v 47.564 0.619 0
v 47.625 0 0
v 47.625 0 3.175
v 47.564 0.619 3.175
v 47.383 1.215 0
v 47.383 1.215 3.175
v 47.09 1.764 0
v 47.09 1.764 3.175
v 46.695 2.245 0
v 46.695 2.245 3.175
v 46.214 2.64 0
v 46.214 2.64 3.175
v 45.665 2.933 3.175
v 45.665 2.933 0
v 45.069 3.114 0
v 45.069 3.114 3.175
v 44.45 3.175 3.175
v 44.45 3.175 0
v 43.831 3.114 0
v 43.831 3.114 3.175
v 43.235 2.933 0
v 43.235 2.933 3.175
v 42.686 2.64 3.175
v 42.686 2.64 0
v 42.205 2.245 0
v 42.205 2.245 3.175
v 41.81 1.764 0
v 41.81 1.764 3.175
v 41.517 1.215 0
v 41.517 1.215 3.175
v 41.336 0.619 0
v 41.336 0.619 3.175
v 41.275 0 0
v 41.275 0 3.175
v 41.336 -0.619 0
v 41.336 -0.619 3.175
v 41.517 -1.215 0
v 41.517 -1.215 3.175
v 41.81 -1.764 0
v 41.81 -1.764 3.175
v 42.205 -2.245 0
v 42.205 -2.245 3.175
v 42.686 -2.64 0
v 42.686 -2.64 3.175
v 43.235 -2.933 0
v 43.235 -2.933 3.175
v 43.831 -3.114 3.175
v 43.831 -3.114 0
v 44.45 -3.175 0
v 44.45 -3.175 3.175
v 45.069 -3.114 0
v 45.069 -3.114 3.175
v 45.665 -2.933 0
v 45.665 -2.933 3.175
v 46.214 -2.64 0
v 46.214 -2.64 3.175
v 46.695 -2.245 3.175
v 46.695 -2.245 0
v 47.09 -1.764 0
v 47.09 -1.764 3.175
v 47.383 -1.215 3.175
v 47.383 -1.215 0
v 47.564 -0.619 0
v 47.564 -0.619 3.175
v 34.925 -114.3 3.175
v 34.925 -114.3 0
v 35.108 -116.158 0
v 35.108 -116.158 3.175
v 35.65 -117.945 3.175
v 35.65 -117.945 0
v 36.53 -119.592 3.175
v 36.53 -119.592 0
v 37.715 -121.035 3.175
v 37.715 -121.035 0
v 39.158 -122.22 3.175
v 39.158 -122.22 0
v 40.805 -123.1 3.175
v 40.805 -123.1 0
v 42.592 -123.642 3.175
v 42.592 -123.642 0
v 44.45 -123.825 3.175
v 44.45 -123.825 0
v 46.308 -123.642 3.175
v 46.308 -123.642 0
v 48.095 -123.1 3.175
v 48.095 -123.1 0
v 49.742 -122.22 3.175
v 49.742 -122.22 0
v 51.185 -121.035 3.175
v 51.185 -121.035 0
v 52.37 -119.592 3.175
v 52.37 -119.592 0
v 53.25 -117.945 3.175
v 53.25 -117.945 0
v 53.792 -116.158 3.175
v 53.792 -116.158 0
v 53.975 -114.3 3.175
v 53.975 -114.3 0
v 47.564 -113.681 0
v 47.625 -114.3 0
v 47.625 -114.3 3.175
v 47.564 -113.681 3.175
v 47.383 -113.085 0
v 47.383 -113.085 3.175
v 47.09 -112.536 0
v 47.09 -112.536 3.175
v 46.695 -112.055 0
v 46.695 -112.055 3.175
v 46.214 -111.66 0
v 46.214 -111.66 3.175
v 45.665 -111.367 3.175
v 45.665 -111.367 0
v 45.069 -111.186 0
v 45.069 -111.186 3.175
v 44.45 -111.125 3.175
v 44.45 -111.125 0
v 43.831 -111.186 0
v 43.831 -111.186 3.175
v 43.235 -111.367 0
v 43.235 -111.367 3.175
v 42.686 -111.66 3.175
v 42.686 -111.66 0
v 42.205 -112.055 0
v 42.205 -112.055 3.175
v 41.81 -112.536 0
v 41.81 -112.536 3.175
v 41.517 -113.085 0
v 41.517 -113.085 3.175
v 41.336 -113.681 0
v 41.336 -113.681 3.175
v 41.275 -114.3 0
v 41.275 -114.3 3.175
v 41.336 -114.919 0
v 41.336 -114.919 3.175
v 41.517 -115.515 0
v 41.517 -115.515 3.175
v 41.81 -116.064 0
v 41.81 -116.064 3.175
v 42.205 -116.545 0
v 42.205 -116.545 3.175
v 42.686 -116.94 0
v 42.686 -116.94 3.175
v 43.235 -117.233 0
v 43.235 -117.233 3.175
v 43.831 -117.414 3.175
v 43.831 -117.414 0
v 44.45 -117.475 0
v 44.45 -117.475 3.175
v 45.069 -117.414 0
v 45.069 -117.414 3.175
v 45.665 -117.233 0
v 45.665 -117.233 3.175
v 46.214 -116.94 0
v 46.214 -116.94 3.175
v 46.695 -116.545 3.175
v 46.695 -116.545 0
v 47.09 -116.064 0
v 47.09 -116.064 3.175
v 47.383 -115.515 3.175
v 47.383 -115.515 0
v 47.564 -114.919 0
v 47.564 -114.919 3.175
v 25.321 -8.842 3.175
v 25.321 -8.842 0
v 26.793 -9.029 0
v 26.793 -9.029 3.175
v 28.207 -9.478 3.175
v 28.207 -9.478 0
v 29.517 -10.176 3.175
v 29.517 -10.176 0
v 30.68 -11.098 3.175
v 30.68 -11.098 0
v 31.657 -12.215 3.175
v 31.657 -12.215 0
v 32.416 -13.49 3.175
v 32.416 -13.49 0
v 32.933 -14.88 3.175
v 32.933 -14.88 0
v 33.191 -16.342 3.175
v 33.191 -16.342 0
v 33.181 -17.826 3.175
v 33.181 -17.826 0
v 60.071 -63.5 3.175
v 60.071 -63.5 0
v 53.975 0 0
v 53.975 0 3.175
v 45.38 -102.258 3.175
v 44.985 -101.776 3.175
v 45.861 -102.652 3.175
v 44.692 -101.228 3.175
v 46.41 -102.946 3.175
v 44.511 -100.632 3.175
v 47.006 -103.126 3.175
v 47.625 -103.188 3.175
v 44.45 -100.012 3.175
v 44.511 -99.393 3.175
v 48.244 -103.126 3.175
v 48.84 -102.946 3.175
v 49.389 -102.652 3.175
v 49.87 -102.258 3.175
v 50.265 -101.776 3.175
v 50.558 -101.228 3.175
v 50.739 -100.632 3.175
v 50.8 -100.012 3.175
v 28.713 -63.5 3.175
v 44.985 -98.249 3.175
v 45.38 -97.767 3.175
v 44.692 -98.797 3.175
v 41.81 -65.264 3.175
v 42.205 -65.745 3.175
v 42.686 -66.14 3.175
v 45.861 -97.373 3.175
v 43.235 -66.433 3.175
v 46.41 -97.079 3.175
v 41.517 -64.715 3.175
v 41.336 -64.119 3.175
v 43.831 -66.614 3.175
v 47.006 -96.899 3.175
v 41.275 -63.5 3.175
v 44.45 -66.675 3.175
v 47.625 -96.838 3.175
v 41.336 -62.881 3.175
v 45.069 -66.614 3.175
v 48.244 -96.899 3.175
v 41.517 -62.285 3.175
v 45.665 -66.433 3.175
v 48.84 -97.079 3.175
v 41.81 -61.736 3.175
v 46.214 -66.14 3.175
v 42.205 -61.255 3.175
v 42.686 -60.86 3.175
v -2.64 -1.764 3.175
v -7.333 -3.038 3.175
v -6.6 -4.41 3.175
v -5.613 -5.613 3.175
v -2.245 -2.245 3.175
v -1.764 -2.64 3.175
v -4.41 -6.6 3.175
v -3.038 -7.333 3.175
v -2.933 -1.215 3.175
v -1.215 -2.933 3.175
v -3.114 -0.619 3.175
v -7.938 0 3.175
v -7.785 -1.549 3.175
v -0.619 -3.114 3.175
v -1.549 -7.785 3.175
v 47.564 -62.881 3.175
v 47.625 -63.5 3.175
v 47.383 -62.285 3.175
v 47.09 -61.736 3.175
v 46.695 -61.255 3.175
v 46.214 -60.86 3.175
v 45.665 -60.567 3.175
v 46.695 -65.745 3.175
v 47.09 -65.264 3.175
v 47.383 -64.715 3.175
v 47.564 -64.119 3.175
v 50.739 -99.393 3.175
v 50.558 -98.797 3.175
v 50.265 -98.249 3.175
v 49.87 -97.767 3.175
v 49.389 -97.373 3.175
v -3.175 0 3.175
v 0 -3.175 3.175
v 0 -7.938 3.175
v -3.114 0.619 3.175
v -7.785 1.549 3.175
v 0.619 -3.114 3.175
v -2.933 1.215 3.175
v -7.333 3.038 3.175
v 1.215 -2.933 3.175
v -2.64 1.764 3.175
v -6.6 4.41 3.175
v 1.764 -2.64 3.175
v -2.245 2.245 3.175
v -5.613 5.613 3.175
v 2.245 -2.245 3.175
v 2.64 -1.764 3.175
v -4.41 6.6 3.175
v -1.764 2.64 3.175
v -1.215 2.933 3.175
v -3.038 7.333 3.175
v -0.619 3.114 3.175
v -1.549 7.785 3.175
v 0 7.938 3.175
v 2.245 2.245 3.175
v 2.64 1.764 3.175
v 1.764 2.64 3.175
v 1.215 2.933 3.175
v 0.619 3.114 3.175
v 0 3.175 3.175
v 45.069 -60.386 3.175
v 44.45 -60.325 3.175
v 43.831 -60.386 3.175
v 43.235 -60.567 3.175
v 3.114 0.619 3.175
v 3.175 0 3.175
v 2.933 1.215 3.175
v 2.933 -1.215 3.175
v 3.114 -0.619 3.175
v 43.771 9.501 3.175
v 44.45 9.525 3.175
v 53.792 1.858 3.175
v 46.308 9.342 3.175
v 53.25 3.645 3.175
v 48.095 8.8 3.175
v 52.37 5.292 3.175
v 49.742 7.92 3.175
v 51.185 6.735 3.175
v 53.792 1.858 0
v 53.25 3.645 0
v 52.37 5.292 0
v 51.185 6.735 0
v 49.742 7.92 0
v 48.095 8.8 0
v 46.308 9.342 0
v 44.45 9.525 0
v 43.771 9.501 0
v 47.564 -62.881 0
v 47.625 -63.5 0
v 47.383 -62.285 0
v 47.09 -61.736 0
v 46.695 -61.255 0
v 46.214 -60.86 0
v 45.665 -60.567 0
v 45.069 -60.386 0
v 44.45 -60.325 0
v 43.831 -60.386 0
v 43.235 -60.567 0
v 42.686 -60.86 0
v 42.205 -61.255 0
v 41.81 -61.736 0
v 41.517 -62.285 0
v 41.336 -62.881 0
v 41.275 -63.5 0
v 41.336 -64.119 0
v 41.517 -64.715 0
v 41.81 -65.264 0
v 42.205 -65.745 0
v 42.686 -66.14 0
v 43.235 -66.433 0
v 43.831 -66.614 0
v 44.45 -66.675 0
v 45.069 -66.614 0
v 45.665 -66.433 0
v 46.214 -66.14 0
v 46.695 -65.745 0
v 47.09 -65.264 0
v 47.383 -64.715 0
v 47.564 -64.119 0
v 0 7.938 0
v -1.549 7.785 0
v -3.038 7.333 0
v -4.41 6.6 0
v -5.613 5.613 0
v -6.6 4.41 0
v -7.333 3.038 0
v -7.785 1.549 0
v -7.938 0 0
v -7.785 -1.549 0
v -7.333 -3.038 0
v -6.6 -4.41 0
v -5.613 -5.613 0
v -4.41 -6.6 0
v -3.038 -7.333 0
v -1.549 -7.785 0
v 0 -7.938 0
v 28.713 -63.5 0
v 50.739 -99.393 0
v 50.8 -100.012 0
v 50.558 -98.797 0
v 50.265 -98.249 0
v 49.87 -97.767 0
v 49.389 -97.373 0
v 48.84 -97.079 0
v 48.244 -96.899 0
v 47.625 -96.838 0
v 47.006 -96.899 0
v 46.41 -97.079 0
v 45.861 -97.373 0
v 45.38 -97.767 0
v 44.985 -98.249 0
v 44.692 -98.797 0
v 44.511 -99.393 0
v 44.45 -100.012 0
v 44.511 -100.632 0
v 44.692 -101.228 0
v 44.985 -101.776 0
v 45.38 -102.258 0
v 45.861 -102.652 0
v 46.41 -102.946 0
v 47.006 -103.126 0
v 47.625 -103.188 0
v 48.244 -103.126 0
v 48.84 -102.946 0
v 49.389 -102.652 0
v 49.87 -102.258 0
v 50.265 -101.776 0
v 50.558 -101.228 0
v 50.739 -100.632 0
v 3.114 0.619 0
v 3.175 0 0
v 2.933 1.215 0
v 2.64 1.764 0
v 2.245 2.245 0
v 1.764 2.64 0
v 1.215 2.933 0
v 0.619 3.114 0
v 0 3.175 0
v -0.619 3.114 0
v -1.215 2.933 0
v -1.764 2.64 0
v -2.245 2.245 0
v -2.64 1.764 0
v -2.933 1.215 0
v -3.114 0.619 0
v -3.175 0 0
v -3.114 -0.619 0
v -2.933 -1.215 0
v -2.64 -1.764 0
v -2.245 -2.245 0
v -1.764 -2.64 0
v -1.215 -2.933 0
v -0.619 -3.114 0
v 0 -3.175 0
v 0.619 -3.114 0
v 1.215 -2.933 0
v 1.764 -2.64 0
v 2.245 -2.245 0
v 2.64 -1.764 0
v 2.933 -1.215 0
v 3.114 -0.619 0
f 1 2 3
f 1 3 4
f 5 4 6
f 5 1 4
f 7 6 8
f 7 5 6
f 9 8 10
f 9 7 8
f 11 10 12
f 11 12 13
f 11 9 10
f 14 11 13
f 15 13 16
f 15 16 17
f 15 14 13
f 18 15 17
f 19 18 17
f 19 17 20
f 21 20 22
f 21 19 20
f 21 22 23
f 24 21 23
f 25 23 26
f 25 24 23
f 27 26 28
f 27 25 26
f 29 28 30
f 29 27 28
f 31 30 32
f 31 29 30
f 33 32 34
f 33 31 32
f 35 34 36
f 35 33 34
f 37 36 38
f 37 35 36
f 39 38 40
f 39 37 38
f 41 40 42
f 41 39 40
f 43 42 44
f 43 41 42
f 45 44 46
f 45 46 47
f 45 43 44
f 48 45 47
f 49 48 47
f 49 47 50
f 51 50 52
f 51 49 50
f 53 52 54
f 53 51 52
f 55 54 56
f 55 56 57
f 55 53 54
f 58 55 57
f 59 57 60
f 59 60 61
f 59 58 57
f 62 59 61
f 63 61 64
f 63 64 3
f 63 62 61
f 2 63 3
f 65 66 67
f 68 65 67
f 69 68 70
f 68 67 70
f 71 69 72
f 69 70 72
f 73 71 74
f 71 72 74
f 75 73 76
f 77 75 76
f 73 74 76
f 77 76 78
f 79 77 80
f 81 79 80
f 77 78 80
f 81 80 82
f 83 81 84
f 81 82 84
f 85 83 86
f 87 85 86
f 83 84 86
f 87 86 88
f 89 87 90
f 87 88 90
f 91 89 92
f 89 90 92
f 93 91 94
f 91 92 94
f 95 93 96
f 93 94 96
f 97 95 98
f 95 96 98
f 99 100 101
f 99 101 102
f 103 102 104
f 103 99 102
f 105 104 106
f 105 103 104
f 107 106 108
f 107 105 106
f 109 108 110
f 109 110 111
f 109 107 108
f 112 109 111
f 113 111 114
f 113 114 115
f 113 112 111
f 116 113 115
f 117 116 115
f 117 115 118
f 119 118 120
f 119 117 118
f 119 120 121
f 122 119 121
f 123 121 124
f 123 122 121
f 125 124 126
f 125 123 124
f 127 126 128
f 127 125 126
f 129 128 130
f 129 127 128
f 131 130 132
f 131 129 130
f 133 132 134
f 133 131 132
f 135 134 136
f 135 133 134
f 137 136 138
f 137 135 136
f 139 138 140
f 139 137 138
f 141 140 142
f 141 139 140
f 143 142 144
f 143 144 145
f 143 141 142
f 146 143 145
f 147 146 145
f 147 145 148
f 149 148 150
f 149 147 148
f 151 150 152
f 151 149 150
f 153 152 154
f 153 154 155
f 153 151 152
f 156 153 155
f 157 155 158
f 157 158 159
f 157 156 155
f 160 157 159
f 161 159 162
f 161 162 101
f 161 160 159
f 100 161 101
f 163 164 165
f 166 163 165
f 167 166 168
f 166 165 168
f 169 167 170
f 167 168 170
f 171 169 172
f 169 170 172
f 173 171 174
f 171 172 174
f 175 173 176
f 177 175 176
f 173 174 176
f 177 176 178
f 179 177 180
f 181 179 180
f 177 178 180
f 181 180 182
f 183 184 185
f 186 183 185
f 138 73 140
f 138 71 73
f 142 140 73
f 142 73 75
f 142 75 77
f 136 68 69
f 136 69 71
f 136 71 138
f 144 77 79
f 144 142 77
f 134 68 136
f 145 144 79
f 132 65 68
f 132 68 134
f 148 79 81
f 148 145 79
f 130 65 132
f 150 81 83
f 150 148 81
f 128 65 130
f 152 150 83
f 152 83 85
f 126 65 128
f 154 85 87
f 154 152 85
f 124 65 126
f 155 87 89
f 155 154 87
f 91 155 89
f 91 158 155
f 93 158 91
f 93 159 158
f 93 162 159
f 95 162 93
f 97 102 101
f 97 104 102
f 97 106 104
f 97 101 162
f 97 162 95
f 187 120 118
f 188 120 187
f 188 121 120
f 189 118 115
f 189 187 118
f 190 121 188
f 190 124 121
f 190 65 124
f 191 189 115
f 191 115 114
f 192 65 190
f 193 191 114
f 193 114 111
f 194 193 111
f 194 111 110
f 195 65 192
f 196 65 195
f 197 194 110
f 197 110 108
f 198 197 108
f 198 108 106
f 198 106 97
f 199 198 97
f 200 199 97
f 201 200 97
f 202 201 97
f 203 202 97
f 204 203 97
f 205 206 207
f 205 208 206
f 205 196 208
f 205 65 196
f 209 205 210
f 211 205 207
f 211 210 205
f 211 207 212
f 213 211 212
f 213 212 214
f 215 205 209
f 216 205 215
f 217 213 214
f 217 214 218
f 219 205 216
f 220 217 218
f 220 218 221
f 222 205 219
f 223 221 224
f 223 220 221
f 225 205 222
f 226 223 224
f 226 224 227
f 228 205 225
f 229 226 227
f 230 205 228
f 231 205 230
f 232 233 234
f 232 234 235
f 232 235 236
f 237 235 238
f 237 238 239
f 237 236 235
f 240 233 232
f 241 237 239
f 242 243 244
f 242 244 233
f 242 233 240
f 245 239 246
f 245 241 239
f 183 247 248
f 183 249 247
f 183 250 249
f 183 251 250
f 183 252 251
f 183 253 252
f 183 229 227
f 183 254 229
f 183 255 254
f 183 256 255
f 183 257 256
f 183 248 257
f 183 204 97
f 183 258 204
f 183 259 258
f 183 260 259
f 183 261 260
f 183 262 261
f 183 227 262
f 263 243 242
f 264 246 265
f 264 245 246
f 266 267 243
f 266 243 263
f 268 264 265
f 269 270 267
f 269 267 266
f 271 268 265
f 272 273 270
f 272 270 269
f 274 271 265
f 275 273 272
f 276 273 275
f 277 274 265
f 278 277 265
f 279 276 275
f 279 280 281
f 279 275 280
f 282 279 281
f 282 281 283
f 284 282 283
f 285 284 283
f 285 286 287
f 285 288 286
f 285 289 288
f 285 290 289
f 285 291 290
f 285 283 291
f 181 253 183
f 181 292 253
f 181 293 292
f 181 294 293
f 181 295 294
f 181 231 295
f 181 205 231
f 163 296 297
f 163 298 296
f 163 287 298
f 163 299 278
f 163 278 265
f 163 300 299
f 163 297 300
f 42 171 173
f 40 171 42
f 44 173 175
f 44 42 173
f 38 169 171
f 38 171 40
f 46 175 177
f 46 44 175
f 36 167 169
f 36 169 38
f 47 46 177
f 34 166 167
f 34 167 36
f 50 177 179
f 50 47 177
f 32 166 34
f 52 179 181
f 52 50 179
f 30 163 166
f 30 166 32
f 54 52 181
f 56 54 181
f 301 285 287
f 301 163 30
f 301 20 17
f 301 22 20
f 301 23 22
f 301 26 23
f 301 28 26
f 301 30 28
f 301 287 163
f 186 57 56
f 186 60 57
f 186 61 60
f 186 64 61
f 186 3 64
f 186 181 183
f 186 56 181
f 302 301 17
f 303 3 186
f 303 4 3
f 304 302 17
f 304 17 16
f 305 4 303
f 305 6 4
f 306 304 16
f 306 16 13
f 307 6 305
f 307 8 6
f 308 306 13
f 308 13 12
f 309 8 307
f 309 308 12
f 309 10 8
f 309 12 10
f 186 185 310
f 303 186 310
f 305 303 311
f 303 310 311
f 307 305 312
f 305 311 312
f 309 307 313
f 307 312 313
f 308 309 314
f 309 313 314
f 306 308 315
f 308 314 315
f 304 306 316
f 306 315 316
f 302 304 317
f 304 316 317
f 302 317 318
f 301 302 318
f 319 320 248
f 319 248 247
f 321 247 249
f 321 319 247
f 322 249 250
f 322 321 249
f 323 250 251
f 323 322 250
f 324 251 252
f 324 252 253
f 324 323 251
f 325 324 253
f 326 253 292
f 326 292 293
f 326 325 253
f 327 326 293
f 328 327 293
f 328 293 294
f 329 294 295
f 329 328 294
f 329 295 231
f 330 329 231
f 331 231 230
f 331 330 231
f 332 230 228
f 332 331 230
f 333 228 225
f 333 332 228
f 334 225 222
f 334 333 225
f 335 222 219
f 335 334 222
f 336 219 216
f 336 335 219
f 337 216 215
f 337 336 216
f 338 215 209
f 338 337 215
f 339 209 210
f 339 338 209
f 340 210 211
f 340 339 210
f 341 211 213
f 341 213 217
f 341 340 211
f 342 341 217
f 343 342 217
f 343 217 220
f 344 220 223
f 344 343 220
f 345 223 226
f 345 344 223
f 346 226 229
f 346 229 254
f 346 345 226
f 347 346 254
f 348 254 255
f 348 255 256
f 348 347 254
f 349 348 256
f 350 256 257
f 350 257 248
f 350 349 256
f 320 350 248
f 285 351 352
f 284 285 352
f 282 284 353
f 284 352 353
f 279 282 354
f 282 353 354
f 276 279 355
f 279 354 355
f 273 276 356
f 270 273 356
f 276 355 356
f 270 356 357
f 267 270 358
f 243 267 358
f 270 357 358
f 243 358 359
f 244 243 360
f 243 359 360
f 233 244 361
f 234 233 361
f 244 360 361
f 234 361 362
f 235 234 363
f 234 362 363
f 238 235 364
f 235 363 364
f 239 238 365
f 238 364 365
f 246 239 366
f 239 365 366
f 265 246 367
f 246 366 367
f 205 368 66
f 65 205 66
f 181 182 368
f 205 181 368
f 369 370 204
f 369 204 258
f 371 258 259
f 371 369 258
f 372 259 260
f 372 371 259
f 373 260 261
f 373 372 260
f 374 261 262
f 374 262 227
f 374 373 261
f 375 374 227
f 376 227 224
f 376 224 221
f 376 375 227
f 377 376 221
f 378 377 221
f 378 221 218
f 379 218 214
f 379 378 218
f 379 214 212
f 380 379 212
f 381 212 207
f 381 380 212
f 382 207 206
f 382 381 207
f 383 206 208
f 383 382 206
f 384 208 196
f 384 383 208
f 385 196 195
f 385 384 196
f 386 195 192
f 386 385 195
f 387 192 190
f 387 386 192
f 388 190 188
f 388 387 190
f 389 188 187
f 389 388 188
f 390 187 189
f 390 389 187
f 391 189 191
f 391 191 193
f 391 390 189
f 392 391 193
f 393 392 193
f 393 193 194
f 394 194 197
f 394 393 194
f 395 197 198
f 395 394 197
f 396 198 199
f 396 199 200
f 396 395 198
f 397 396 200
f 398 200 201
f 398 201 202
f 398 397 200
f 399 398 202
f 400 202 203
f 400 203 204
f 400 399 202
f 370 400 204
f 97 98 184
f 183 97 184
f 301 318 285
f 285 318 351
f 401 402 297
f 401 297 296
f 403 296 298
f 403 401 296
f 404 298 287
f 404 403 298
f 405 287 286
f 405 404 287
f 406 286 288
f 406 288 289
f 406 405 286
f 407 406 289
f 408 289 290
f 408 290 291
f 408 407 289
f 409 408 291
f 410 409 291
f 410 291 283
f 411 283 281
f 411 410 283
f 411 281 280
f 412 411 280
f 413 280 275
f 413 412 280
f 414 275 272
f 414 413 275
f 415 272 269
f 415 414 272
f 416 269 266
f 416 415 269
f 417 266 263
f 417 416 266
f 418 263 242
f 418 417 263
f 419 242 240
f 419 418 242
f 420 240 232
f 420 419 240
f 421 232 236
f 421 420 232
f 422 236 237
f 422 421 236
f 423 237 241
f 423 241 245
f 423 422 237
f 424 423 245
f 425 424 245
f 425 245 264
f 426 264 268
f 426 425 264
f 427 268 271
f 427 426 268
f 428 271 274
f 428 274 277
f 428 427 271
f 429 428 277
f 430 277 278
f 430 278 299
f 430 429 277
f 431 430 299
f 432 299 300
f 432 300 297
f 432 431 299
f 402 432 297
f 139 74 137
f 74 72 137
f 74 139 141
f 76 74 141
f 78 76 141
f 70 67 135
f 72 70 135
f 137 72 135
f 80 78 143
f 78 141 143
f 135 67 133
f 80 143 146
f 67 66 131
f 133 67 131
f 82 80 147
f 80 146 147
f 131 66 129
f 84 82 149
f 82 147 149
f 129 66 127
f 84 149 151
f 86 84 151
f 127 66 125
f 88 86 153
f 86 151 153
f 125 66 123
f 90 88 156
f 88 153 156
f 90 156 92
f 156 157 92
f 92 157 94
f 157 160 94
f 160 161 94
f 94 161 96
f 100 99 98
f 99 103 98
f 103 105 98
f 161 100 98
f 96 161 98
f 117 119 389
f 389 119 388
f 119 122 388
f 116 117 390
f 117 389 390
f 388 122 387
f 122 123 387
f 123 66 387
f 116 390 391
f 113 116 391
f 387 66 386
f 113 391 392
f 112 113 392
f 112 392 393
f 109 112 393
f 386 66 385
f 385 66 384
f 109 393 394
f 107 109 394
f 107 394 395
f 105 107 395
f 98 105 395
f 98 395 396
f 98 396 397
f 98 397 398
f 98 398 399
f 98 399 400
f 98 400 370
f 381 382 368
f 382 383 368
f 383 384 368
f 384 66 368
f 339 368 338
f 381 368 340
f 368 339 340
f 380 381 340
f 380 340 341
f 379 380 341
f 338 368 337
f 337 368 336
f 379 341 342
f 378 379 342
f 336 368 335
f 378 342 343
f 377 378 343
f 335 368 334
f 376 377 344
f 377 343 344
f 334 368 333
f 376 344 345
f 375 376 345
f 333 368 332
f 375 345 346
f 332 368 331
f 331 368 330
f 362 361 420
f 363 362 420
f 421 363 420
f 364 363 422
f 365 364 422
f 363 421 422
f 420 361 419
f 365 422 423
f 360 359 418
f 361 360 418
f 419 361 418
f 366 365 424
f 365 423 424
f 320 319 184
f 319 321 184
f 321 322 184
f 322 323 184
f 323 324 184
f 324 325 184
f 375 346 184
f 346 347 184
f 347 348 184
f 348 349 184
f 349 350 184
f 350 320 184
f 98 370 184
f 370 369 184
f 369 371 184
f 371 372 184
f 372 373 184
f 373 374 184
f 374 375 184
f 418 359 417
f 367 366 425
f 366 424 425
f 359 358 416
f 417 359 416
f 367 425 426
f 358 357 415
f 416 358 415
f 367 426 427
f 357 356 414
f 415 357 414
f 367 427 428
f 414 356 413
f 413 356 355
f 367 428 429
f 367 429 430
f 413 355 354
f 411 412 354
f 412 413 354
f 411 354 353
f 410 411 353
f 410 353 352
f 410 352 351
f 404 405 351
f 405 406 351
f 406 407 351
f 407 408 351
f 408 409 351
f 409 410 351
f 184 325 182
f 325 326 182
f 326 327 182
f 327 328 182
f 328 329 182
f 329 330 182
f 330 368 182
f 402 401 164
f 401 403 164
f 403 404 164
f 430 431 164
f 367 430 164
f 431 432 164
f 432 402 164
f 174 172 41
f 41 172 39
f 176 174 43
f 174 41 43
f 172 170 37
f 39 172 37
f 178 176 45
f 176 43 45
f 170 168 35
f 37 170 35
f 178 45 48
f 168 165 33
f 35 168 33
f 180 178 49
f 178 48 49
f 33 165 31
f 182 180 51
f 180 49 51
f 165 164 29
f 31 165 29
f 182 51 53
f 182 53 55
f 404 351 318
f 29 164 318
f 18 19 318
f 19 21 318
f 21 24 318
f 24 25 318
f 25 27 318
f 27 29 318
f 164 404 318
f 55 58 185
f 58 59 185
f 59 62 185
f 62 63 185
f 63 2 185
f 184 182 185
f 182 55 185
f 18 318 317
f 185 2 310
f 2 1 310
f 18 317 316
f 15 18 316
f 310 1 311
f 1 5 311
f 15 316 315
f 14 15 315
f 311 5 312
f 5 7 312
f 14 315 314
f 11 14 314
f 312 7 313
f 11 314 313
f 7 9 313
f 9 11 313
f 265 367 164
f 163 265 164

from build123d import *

# Parameters (mm, degrees)
F0_R     = 3.175
F1_DEPTH = 3.175


with BuildPart() as f1:
    # F0 (on Top) → F1 (new body)
    with BuildSketch(Plane.XY):
        with BuildLine():
            Line((43.77051, 9.500732), (0, 7.9375))
            ThreePointArc((0, 7.9375), (-7.9375, 0), (0, -7.9375))
            Line((0, -7.9375), (25.320855, -8.841816))
            ThreePointArc((25.320855, -8.841816), (31.19345, -11.634219), (33.181066, -17.825685))
            Line((33.181066, -17.825685), (28.712627, -63.5))
            Line((28.712627, -63.5), (34.925, -114.3))
            ThreePointArc((34.925, -114.3), (44.45, -123.825), (53.975, -114.3))
            Line((53.975, -114.3), (60.071, -63.5))
            Line((60.071, -63.5), (53.975, 0))
            ThreePointArc((53.975, 0), (51.185192, 6.735192), (44.45, 9.525))
            Line((44.45, 9.525), (43.77051, 9.500732))
        make_face()
        with Locations((44.45, -114.3)):
            Circle(F0_R, mode=Mode.SUBTRACT)
        with Locations((47.625, -100.0125)):
            Circle(F0_R, mode=Mode.SUBTRACT)
        with Locations((44.45, -63.5)):
            Circle(F0_R, mode=Mode.SUBTRACT)
        Circle(F0_R, mode=Mode.SUBTRACT)
        with Locations((44.45, 0)):
            Circle(F0_R, mode=Mode.SUBTRACT)
    extrude(amount=F1_DEPTH)


solid = f1.part
